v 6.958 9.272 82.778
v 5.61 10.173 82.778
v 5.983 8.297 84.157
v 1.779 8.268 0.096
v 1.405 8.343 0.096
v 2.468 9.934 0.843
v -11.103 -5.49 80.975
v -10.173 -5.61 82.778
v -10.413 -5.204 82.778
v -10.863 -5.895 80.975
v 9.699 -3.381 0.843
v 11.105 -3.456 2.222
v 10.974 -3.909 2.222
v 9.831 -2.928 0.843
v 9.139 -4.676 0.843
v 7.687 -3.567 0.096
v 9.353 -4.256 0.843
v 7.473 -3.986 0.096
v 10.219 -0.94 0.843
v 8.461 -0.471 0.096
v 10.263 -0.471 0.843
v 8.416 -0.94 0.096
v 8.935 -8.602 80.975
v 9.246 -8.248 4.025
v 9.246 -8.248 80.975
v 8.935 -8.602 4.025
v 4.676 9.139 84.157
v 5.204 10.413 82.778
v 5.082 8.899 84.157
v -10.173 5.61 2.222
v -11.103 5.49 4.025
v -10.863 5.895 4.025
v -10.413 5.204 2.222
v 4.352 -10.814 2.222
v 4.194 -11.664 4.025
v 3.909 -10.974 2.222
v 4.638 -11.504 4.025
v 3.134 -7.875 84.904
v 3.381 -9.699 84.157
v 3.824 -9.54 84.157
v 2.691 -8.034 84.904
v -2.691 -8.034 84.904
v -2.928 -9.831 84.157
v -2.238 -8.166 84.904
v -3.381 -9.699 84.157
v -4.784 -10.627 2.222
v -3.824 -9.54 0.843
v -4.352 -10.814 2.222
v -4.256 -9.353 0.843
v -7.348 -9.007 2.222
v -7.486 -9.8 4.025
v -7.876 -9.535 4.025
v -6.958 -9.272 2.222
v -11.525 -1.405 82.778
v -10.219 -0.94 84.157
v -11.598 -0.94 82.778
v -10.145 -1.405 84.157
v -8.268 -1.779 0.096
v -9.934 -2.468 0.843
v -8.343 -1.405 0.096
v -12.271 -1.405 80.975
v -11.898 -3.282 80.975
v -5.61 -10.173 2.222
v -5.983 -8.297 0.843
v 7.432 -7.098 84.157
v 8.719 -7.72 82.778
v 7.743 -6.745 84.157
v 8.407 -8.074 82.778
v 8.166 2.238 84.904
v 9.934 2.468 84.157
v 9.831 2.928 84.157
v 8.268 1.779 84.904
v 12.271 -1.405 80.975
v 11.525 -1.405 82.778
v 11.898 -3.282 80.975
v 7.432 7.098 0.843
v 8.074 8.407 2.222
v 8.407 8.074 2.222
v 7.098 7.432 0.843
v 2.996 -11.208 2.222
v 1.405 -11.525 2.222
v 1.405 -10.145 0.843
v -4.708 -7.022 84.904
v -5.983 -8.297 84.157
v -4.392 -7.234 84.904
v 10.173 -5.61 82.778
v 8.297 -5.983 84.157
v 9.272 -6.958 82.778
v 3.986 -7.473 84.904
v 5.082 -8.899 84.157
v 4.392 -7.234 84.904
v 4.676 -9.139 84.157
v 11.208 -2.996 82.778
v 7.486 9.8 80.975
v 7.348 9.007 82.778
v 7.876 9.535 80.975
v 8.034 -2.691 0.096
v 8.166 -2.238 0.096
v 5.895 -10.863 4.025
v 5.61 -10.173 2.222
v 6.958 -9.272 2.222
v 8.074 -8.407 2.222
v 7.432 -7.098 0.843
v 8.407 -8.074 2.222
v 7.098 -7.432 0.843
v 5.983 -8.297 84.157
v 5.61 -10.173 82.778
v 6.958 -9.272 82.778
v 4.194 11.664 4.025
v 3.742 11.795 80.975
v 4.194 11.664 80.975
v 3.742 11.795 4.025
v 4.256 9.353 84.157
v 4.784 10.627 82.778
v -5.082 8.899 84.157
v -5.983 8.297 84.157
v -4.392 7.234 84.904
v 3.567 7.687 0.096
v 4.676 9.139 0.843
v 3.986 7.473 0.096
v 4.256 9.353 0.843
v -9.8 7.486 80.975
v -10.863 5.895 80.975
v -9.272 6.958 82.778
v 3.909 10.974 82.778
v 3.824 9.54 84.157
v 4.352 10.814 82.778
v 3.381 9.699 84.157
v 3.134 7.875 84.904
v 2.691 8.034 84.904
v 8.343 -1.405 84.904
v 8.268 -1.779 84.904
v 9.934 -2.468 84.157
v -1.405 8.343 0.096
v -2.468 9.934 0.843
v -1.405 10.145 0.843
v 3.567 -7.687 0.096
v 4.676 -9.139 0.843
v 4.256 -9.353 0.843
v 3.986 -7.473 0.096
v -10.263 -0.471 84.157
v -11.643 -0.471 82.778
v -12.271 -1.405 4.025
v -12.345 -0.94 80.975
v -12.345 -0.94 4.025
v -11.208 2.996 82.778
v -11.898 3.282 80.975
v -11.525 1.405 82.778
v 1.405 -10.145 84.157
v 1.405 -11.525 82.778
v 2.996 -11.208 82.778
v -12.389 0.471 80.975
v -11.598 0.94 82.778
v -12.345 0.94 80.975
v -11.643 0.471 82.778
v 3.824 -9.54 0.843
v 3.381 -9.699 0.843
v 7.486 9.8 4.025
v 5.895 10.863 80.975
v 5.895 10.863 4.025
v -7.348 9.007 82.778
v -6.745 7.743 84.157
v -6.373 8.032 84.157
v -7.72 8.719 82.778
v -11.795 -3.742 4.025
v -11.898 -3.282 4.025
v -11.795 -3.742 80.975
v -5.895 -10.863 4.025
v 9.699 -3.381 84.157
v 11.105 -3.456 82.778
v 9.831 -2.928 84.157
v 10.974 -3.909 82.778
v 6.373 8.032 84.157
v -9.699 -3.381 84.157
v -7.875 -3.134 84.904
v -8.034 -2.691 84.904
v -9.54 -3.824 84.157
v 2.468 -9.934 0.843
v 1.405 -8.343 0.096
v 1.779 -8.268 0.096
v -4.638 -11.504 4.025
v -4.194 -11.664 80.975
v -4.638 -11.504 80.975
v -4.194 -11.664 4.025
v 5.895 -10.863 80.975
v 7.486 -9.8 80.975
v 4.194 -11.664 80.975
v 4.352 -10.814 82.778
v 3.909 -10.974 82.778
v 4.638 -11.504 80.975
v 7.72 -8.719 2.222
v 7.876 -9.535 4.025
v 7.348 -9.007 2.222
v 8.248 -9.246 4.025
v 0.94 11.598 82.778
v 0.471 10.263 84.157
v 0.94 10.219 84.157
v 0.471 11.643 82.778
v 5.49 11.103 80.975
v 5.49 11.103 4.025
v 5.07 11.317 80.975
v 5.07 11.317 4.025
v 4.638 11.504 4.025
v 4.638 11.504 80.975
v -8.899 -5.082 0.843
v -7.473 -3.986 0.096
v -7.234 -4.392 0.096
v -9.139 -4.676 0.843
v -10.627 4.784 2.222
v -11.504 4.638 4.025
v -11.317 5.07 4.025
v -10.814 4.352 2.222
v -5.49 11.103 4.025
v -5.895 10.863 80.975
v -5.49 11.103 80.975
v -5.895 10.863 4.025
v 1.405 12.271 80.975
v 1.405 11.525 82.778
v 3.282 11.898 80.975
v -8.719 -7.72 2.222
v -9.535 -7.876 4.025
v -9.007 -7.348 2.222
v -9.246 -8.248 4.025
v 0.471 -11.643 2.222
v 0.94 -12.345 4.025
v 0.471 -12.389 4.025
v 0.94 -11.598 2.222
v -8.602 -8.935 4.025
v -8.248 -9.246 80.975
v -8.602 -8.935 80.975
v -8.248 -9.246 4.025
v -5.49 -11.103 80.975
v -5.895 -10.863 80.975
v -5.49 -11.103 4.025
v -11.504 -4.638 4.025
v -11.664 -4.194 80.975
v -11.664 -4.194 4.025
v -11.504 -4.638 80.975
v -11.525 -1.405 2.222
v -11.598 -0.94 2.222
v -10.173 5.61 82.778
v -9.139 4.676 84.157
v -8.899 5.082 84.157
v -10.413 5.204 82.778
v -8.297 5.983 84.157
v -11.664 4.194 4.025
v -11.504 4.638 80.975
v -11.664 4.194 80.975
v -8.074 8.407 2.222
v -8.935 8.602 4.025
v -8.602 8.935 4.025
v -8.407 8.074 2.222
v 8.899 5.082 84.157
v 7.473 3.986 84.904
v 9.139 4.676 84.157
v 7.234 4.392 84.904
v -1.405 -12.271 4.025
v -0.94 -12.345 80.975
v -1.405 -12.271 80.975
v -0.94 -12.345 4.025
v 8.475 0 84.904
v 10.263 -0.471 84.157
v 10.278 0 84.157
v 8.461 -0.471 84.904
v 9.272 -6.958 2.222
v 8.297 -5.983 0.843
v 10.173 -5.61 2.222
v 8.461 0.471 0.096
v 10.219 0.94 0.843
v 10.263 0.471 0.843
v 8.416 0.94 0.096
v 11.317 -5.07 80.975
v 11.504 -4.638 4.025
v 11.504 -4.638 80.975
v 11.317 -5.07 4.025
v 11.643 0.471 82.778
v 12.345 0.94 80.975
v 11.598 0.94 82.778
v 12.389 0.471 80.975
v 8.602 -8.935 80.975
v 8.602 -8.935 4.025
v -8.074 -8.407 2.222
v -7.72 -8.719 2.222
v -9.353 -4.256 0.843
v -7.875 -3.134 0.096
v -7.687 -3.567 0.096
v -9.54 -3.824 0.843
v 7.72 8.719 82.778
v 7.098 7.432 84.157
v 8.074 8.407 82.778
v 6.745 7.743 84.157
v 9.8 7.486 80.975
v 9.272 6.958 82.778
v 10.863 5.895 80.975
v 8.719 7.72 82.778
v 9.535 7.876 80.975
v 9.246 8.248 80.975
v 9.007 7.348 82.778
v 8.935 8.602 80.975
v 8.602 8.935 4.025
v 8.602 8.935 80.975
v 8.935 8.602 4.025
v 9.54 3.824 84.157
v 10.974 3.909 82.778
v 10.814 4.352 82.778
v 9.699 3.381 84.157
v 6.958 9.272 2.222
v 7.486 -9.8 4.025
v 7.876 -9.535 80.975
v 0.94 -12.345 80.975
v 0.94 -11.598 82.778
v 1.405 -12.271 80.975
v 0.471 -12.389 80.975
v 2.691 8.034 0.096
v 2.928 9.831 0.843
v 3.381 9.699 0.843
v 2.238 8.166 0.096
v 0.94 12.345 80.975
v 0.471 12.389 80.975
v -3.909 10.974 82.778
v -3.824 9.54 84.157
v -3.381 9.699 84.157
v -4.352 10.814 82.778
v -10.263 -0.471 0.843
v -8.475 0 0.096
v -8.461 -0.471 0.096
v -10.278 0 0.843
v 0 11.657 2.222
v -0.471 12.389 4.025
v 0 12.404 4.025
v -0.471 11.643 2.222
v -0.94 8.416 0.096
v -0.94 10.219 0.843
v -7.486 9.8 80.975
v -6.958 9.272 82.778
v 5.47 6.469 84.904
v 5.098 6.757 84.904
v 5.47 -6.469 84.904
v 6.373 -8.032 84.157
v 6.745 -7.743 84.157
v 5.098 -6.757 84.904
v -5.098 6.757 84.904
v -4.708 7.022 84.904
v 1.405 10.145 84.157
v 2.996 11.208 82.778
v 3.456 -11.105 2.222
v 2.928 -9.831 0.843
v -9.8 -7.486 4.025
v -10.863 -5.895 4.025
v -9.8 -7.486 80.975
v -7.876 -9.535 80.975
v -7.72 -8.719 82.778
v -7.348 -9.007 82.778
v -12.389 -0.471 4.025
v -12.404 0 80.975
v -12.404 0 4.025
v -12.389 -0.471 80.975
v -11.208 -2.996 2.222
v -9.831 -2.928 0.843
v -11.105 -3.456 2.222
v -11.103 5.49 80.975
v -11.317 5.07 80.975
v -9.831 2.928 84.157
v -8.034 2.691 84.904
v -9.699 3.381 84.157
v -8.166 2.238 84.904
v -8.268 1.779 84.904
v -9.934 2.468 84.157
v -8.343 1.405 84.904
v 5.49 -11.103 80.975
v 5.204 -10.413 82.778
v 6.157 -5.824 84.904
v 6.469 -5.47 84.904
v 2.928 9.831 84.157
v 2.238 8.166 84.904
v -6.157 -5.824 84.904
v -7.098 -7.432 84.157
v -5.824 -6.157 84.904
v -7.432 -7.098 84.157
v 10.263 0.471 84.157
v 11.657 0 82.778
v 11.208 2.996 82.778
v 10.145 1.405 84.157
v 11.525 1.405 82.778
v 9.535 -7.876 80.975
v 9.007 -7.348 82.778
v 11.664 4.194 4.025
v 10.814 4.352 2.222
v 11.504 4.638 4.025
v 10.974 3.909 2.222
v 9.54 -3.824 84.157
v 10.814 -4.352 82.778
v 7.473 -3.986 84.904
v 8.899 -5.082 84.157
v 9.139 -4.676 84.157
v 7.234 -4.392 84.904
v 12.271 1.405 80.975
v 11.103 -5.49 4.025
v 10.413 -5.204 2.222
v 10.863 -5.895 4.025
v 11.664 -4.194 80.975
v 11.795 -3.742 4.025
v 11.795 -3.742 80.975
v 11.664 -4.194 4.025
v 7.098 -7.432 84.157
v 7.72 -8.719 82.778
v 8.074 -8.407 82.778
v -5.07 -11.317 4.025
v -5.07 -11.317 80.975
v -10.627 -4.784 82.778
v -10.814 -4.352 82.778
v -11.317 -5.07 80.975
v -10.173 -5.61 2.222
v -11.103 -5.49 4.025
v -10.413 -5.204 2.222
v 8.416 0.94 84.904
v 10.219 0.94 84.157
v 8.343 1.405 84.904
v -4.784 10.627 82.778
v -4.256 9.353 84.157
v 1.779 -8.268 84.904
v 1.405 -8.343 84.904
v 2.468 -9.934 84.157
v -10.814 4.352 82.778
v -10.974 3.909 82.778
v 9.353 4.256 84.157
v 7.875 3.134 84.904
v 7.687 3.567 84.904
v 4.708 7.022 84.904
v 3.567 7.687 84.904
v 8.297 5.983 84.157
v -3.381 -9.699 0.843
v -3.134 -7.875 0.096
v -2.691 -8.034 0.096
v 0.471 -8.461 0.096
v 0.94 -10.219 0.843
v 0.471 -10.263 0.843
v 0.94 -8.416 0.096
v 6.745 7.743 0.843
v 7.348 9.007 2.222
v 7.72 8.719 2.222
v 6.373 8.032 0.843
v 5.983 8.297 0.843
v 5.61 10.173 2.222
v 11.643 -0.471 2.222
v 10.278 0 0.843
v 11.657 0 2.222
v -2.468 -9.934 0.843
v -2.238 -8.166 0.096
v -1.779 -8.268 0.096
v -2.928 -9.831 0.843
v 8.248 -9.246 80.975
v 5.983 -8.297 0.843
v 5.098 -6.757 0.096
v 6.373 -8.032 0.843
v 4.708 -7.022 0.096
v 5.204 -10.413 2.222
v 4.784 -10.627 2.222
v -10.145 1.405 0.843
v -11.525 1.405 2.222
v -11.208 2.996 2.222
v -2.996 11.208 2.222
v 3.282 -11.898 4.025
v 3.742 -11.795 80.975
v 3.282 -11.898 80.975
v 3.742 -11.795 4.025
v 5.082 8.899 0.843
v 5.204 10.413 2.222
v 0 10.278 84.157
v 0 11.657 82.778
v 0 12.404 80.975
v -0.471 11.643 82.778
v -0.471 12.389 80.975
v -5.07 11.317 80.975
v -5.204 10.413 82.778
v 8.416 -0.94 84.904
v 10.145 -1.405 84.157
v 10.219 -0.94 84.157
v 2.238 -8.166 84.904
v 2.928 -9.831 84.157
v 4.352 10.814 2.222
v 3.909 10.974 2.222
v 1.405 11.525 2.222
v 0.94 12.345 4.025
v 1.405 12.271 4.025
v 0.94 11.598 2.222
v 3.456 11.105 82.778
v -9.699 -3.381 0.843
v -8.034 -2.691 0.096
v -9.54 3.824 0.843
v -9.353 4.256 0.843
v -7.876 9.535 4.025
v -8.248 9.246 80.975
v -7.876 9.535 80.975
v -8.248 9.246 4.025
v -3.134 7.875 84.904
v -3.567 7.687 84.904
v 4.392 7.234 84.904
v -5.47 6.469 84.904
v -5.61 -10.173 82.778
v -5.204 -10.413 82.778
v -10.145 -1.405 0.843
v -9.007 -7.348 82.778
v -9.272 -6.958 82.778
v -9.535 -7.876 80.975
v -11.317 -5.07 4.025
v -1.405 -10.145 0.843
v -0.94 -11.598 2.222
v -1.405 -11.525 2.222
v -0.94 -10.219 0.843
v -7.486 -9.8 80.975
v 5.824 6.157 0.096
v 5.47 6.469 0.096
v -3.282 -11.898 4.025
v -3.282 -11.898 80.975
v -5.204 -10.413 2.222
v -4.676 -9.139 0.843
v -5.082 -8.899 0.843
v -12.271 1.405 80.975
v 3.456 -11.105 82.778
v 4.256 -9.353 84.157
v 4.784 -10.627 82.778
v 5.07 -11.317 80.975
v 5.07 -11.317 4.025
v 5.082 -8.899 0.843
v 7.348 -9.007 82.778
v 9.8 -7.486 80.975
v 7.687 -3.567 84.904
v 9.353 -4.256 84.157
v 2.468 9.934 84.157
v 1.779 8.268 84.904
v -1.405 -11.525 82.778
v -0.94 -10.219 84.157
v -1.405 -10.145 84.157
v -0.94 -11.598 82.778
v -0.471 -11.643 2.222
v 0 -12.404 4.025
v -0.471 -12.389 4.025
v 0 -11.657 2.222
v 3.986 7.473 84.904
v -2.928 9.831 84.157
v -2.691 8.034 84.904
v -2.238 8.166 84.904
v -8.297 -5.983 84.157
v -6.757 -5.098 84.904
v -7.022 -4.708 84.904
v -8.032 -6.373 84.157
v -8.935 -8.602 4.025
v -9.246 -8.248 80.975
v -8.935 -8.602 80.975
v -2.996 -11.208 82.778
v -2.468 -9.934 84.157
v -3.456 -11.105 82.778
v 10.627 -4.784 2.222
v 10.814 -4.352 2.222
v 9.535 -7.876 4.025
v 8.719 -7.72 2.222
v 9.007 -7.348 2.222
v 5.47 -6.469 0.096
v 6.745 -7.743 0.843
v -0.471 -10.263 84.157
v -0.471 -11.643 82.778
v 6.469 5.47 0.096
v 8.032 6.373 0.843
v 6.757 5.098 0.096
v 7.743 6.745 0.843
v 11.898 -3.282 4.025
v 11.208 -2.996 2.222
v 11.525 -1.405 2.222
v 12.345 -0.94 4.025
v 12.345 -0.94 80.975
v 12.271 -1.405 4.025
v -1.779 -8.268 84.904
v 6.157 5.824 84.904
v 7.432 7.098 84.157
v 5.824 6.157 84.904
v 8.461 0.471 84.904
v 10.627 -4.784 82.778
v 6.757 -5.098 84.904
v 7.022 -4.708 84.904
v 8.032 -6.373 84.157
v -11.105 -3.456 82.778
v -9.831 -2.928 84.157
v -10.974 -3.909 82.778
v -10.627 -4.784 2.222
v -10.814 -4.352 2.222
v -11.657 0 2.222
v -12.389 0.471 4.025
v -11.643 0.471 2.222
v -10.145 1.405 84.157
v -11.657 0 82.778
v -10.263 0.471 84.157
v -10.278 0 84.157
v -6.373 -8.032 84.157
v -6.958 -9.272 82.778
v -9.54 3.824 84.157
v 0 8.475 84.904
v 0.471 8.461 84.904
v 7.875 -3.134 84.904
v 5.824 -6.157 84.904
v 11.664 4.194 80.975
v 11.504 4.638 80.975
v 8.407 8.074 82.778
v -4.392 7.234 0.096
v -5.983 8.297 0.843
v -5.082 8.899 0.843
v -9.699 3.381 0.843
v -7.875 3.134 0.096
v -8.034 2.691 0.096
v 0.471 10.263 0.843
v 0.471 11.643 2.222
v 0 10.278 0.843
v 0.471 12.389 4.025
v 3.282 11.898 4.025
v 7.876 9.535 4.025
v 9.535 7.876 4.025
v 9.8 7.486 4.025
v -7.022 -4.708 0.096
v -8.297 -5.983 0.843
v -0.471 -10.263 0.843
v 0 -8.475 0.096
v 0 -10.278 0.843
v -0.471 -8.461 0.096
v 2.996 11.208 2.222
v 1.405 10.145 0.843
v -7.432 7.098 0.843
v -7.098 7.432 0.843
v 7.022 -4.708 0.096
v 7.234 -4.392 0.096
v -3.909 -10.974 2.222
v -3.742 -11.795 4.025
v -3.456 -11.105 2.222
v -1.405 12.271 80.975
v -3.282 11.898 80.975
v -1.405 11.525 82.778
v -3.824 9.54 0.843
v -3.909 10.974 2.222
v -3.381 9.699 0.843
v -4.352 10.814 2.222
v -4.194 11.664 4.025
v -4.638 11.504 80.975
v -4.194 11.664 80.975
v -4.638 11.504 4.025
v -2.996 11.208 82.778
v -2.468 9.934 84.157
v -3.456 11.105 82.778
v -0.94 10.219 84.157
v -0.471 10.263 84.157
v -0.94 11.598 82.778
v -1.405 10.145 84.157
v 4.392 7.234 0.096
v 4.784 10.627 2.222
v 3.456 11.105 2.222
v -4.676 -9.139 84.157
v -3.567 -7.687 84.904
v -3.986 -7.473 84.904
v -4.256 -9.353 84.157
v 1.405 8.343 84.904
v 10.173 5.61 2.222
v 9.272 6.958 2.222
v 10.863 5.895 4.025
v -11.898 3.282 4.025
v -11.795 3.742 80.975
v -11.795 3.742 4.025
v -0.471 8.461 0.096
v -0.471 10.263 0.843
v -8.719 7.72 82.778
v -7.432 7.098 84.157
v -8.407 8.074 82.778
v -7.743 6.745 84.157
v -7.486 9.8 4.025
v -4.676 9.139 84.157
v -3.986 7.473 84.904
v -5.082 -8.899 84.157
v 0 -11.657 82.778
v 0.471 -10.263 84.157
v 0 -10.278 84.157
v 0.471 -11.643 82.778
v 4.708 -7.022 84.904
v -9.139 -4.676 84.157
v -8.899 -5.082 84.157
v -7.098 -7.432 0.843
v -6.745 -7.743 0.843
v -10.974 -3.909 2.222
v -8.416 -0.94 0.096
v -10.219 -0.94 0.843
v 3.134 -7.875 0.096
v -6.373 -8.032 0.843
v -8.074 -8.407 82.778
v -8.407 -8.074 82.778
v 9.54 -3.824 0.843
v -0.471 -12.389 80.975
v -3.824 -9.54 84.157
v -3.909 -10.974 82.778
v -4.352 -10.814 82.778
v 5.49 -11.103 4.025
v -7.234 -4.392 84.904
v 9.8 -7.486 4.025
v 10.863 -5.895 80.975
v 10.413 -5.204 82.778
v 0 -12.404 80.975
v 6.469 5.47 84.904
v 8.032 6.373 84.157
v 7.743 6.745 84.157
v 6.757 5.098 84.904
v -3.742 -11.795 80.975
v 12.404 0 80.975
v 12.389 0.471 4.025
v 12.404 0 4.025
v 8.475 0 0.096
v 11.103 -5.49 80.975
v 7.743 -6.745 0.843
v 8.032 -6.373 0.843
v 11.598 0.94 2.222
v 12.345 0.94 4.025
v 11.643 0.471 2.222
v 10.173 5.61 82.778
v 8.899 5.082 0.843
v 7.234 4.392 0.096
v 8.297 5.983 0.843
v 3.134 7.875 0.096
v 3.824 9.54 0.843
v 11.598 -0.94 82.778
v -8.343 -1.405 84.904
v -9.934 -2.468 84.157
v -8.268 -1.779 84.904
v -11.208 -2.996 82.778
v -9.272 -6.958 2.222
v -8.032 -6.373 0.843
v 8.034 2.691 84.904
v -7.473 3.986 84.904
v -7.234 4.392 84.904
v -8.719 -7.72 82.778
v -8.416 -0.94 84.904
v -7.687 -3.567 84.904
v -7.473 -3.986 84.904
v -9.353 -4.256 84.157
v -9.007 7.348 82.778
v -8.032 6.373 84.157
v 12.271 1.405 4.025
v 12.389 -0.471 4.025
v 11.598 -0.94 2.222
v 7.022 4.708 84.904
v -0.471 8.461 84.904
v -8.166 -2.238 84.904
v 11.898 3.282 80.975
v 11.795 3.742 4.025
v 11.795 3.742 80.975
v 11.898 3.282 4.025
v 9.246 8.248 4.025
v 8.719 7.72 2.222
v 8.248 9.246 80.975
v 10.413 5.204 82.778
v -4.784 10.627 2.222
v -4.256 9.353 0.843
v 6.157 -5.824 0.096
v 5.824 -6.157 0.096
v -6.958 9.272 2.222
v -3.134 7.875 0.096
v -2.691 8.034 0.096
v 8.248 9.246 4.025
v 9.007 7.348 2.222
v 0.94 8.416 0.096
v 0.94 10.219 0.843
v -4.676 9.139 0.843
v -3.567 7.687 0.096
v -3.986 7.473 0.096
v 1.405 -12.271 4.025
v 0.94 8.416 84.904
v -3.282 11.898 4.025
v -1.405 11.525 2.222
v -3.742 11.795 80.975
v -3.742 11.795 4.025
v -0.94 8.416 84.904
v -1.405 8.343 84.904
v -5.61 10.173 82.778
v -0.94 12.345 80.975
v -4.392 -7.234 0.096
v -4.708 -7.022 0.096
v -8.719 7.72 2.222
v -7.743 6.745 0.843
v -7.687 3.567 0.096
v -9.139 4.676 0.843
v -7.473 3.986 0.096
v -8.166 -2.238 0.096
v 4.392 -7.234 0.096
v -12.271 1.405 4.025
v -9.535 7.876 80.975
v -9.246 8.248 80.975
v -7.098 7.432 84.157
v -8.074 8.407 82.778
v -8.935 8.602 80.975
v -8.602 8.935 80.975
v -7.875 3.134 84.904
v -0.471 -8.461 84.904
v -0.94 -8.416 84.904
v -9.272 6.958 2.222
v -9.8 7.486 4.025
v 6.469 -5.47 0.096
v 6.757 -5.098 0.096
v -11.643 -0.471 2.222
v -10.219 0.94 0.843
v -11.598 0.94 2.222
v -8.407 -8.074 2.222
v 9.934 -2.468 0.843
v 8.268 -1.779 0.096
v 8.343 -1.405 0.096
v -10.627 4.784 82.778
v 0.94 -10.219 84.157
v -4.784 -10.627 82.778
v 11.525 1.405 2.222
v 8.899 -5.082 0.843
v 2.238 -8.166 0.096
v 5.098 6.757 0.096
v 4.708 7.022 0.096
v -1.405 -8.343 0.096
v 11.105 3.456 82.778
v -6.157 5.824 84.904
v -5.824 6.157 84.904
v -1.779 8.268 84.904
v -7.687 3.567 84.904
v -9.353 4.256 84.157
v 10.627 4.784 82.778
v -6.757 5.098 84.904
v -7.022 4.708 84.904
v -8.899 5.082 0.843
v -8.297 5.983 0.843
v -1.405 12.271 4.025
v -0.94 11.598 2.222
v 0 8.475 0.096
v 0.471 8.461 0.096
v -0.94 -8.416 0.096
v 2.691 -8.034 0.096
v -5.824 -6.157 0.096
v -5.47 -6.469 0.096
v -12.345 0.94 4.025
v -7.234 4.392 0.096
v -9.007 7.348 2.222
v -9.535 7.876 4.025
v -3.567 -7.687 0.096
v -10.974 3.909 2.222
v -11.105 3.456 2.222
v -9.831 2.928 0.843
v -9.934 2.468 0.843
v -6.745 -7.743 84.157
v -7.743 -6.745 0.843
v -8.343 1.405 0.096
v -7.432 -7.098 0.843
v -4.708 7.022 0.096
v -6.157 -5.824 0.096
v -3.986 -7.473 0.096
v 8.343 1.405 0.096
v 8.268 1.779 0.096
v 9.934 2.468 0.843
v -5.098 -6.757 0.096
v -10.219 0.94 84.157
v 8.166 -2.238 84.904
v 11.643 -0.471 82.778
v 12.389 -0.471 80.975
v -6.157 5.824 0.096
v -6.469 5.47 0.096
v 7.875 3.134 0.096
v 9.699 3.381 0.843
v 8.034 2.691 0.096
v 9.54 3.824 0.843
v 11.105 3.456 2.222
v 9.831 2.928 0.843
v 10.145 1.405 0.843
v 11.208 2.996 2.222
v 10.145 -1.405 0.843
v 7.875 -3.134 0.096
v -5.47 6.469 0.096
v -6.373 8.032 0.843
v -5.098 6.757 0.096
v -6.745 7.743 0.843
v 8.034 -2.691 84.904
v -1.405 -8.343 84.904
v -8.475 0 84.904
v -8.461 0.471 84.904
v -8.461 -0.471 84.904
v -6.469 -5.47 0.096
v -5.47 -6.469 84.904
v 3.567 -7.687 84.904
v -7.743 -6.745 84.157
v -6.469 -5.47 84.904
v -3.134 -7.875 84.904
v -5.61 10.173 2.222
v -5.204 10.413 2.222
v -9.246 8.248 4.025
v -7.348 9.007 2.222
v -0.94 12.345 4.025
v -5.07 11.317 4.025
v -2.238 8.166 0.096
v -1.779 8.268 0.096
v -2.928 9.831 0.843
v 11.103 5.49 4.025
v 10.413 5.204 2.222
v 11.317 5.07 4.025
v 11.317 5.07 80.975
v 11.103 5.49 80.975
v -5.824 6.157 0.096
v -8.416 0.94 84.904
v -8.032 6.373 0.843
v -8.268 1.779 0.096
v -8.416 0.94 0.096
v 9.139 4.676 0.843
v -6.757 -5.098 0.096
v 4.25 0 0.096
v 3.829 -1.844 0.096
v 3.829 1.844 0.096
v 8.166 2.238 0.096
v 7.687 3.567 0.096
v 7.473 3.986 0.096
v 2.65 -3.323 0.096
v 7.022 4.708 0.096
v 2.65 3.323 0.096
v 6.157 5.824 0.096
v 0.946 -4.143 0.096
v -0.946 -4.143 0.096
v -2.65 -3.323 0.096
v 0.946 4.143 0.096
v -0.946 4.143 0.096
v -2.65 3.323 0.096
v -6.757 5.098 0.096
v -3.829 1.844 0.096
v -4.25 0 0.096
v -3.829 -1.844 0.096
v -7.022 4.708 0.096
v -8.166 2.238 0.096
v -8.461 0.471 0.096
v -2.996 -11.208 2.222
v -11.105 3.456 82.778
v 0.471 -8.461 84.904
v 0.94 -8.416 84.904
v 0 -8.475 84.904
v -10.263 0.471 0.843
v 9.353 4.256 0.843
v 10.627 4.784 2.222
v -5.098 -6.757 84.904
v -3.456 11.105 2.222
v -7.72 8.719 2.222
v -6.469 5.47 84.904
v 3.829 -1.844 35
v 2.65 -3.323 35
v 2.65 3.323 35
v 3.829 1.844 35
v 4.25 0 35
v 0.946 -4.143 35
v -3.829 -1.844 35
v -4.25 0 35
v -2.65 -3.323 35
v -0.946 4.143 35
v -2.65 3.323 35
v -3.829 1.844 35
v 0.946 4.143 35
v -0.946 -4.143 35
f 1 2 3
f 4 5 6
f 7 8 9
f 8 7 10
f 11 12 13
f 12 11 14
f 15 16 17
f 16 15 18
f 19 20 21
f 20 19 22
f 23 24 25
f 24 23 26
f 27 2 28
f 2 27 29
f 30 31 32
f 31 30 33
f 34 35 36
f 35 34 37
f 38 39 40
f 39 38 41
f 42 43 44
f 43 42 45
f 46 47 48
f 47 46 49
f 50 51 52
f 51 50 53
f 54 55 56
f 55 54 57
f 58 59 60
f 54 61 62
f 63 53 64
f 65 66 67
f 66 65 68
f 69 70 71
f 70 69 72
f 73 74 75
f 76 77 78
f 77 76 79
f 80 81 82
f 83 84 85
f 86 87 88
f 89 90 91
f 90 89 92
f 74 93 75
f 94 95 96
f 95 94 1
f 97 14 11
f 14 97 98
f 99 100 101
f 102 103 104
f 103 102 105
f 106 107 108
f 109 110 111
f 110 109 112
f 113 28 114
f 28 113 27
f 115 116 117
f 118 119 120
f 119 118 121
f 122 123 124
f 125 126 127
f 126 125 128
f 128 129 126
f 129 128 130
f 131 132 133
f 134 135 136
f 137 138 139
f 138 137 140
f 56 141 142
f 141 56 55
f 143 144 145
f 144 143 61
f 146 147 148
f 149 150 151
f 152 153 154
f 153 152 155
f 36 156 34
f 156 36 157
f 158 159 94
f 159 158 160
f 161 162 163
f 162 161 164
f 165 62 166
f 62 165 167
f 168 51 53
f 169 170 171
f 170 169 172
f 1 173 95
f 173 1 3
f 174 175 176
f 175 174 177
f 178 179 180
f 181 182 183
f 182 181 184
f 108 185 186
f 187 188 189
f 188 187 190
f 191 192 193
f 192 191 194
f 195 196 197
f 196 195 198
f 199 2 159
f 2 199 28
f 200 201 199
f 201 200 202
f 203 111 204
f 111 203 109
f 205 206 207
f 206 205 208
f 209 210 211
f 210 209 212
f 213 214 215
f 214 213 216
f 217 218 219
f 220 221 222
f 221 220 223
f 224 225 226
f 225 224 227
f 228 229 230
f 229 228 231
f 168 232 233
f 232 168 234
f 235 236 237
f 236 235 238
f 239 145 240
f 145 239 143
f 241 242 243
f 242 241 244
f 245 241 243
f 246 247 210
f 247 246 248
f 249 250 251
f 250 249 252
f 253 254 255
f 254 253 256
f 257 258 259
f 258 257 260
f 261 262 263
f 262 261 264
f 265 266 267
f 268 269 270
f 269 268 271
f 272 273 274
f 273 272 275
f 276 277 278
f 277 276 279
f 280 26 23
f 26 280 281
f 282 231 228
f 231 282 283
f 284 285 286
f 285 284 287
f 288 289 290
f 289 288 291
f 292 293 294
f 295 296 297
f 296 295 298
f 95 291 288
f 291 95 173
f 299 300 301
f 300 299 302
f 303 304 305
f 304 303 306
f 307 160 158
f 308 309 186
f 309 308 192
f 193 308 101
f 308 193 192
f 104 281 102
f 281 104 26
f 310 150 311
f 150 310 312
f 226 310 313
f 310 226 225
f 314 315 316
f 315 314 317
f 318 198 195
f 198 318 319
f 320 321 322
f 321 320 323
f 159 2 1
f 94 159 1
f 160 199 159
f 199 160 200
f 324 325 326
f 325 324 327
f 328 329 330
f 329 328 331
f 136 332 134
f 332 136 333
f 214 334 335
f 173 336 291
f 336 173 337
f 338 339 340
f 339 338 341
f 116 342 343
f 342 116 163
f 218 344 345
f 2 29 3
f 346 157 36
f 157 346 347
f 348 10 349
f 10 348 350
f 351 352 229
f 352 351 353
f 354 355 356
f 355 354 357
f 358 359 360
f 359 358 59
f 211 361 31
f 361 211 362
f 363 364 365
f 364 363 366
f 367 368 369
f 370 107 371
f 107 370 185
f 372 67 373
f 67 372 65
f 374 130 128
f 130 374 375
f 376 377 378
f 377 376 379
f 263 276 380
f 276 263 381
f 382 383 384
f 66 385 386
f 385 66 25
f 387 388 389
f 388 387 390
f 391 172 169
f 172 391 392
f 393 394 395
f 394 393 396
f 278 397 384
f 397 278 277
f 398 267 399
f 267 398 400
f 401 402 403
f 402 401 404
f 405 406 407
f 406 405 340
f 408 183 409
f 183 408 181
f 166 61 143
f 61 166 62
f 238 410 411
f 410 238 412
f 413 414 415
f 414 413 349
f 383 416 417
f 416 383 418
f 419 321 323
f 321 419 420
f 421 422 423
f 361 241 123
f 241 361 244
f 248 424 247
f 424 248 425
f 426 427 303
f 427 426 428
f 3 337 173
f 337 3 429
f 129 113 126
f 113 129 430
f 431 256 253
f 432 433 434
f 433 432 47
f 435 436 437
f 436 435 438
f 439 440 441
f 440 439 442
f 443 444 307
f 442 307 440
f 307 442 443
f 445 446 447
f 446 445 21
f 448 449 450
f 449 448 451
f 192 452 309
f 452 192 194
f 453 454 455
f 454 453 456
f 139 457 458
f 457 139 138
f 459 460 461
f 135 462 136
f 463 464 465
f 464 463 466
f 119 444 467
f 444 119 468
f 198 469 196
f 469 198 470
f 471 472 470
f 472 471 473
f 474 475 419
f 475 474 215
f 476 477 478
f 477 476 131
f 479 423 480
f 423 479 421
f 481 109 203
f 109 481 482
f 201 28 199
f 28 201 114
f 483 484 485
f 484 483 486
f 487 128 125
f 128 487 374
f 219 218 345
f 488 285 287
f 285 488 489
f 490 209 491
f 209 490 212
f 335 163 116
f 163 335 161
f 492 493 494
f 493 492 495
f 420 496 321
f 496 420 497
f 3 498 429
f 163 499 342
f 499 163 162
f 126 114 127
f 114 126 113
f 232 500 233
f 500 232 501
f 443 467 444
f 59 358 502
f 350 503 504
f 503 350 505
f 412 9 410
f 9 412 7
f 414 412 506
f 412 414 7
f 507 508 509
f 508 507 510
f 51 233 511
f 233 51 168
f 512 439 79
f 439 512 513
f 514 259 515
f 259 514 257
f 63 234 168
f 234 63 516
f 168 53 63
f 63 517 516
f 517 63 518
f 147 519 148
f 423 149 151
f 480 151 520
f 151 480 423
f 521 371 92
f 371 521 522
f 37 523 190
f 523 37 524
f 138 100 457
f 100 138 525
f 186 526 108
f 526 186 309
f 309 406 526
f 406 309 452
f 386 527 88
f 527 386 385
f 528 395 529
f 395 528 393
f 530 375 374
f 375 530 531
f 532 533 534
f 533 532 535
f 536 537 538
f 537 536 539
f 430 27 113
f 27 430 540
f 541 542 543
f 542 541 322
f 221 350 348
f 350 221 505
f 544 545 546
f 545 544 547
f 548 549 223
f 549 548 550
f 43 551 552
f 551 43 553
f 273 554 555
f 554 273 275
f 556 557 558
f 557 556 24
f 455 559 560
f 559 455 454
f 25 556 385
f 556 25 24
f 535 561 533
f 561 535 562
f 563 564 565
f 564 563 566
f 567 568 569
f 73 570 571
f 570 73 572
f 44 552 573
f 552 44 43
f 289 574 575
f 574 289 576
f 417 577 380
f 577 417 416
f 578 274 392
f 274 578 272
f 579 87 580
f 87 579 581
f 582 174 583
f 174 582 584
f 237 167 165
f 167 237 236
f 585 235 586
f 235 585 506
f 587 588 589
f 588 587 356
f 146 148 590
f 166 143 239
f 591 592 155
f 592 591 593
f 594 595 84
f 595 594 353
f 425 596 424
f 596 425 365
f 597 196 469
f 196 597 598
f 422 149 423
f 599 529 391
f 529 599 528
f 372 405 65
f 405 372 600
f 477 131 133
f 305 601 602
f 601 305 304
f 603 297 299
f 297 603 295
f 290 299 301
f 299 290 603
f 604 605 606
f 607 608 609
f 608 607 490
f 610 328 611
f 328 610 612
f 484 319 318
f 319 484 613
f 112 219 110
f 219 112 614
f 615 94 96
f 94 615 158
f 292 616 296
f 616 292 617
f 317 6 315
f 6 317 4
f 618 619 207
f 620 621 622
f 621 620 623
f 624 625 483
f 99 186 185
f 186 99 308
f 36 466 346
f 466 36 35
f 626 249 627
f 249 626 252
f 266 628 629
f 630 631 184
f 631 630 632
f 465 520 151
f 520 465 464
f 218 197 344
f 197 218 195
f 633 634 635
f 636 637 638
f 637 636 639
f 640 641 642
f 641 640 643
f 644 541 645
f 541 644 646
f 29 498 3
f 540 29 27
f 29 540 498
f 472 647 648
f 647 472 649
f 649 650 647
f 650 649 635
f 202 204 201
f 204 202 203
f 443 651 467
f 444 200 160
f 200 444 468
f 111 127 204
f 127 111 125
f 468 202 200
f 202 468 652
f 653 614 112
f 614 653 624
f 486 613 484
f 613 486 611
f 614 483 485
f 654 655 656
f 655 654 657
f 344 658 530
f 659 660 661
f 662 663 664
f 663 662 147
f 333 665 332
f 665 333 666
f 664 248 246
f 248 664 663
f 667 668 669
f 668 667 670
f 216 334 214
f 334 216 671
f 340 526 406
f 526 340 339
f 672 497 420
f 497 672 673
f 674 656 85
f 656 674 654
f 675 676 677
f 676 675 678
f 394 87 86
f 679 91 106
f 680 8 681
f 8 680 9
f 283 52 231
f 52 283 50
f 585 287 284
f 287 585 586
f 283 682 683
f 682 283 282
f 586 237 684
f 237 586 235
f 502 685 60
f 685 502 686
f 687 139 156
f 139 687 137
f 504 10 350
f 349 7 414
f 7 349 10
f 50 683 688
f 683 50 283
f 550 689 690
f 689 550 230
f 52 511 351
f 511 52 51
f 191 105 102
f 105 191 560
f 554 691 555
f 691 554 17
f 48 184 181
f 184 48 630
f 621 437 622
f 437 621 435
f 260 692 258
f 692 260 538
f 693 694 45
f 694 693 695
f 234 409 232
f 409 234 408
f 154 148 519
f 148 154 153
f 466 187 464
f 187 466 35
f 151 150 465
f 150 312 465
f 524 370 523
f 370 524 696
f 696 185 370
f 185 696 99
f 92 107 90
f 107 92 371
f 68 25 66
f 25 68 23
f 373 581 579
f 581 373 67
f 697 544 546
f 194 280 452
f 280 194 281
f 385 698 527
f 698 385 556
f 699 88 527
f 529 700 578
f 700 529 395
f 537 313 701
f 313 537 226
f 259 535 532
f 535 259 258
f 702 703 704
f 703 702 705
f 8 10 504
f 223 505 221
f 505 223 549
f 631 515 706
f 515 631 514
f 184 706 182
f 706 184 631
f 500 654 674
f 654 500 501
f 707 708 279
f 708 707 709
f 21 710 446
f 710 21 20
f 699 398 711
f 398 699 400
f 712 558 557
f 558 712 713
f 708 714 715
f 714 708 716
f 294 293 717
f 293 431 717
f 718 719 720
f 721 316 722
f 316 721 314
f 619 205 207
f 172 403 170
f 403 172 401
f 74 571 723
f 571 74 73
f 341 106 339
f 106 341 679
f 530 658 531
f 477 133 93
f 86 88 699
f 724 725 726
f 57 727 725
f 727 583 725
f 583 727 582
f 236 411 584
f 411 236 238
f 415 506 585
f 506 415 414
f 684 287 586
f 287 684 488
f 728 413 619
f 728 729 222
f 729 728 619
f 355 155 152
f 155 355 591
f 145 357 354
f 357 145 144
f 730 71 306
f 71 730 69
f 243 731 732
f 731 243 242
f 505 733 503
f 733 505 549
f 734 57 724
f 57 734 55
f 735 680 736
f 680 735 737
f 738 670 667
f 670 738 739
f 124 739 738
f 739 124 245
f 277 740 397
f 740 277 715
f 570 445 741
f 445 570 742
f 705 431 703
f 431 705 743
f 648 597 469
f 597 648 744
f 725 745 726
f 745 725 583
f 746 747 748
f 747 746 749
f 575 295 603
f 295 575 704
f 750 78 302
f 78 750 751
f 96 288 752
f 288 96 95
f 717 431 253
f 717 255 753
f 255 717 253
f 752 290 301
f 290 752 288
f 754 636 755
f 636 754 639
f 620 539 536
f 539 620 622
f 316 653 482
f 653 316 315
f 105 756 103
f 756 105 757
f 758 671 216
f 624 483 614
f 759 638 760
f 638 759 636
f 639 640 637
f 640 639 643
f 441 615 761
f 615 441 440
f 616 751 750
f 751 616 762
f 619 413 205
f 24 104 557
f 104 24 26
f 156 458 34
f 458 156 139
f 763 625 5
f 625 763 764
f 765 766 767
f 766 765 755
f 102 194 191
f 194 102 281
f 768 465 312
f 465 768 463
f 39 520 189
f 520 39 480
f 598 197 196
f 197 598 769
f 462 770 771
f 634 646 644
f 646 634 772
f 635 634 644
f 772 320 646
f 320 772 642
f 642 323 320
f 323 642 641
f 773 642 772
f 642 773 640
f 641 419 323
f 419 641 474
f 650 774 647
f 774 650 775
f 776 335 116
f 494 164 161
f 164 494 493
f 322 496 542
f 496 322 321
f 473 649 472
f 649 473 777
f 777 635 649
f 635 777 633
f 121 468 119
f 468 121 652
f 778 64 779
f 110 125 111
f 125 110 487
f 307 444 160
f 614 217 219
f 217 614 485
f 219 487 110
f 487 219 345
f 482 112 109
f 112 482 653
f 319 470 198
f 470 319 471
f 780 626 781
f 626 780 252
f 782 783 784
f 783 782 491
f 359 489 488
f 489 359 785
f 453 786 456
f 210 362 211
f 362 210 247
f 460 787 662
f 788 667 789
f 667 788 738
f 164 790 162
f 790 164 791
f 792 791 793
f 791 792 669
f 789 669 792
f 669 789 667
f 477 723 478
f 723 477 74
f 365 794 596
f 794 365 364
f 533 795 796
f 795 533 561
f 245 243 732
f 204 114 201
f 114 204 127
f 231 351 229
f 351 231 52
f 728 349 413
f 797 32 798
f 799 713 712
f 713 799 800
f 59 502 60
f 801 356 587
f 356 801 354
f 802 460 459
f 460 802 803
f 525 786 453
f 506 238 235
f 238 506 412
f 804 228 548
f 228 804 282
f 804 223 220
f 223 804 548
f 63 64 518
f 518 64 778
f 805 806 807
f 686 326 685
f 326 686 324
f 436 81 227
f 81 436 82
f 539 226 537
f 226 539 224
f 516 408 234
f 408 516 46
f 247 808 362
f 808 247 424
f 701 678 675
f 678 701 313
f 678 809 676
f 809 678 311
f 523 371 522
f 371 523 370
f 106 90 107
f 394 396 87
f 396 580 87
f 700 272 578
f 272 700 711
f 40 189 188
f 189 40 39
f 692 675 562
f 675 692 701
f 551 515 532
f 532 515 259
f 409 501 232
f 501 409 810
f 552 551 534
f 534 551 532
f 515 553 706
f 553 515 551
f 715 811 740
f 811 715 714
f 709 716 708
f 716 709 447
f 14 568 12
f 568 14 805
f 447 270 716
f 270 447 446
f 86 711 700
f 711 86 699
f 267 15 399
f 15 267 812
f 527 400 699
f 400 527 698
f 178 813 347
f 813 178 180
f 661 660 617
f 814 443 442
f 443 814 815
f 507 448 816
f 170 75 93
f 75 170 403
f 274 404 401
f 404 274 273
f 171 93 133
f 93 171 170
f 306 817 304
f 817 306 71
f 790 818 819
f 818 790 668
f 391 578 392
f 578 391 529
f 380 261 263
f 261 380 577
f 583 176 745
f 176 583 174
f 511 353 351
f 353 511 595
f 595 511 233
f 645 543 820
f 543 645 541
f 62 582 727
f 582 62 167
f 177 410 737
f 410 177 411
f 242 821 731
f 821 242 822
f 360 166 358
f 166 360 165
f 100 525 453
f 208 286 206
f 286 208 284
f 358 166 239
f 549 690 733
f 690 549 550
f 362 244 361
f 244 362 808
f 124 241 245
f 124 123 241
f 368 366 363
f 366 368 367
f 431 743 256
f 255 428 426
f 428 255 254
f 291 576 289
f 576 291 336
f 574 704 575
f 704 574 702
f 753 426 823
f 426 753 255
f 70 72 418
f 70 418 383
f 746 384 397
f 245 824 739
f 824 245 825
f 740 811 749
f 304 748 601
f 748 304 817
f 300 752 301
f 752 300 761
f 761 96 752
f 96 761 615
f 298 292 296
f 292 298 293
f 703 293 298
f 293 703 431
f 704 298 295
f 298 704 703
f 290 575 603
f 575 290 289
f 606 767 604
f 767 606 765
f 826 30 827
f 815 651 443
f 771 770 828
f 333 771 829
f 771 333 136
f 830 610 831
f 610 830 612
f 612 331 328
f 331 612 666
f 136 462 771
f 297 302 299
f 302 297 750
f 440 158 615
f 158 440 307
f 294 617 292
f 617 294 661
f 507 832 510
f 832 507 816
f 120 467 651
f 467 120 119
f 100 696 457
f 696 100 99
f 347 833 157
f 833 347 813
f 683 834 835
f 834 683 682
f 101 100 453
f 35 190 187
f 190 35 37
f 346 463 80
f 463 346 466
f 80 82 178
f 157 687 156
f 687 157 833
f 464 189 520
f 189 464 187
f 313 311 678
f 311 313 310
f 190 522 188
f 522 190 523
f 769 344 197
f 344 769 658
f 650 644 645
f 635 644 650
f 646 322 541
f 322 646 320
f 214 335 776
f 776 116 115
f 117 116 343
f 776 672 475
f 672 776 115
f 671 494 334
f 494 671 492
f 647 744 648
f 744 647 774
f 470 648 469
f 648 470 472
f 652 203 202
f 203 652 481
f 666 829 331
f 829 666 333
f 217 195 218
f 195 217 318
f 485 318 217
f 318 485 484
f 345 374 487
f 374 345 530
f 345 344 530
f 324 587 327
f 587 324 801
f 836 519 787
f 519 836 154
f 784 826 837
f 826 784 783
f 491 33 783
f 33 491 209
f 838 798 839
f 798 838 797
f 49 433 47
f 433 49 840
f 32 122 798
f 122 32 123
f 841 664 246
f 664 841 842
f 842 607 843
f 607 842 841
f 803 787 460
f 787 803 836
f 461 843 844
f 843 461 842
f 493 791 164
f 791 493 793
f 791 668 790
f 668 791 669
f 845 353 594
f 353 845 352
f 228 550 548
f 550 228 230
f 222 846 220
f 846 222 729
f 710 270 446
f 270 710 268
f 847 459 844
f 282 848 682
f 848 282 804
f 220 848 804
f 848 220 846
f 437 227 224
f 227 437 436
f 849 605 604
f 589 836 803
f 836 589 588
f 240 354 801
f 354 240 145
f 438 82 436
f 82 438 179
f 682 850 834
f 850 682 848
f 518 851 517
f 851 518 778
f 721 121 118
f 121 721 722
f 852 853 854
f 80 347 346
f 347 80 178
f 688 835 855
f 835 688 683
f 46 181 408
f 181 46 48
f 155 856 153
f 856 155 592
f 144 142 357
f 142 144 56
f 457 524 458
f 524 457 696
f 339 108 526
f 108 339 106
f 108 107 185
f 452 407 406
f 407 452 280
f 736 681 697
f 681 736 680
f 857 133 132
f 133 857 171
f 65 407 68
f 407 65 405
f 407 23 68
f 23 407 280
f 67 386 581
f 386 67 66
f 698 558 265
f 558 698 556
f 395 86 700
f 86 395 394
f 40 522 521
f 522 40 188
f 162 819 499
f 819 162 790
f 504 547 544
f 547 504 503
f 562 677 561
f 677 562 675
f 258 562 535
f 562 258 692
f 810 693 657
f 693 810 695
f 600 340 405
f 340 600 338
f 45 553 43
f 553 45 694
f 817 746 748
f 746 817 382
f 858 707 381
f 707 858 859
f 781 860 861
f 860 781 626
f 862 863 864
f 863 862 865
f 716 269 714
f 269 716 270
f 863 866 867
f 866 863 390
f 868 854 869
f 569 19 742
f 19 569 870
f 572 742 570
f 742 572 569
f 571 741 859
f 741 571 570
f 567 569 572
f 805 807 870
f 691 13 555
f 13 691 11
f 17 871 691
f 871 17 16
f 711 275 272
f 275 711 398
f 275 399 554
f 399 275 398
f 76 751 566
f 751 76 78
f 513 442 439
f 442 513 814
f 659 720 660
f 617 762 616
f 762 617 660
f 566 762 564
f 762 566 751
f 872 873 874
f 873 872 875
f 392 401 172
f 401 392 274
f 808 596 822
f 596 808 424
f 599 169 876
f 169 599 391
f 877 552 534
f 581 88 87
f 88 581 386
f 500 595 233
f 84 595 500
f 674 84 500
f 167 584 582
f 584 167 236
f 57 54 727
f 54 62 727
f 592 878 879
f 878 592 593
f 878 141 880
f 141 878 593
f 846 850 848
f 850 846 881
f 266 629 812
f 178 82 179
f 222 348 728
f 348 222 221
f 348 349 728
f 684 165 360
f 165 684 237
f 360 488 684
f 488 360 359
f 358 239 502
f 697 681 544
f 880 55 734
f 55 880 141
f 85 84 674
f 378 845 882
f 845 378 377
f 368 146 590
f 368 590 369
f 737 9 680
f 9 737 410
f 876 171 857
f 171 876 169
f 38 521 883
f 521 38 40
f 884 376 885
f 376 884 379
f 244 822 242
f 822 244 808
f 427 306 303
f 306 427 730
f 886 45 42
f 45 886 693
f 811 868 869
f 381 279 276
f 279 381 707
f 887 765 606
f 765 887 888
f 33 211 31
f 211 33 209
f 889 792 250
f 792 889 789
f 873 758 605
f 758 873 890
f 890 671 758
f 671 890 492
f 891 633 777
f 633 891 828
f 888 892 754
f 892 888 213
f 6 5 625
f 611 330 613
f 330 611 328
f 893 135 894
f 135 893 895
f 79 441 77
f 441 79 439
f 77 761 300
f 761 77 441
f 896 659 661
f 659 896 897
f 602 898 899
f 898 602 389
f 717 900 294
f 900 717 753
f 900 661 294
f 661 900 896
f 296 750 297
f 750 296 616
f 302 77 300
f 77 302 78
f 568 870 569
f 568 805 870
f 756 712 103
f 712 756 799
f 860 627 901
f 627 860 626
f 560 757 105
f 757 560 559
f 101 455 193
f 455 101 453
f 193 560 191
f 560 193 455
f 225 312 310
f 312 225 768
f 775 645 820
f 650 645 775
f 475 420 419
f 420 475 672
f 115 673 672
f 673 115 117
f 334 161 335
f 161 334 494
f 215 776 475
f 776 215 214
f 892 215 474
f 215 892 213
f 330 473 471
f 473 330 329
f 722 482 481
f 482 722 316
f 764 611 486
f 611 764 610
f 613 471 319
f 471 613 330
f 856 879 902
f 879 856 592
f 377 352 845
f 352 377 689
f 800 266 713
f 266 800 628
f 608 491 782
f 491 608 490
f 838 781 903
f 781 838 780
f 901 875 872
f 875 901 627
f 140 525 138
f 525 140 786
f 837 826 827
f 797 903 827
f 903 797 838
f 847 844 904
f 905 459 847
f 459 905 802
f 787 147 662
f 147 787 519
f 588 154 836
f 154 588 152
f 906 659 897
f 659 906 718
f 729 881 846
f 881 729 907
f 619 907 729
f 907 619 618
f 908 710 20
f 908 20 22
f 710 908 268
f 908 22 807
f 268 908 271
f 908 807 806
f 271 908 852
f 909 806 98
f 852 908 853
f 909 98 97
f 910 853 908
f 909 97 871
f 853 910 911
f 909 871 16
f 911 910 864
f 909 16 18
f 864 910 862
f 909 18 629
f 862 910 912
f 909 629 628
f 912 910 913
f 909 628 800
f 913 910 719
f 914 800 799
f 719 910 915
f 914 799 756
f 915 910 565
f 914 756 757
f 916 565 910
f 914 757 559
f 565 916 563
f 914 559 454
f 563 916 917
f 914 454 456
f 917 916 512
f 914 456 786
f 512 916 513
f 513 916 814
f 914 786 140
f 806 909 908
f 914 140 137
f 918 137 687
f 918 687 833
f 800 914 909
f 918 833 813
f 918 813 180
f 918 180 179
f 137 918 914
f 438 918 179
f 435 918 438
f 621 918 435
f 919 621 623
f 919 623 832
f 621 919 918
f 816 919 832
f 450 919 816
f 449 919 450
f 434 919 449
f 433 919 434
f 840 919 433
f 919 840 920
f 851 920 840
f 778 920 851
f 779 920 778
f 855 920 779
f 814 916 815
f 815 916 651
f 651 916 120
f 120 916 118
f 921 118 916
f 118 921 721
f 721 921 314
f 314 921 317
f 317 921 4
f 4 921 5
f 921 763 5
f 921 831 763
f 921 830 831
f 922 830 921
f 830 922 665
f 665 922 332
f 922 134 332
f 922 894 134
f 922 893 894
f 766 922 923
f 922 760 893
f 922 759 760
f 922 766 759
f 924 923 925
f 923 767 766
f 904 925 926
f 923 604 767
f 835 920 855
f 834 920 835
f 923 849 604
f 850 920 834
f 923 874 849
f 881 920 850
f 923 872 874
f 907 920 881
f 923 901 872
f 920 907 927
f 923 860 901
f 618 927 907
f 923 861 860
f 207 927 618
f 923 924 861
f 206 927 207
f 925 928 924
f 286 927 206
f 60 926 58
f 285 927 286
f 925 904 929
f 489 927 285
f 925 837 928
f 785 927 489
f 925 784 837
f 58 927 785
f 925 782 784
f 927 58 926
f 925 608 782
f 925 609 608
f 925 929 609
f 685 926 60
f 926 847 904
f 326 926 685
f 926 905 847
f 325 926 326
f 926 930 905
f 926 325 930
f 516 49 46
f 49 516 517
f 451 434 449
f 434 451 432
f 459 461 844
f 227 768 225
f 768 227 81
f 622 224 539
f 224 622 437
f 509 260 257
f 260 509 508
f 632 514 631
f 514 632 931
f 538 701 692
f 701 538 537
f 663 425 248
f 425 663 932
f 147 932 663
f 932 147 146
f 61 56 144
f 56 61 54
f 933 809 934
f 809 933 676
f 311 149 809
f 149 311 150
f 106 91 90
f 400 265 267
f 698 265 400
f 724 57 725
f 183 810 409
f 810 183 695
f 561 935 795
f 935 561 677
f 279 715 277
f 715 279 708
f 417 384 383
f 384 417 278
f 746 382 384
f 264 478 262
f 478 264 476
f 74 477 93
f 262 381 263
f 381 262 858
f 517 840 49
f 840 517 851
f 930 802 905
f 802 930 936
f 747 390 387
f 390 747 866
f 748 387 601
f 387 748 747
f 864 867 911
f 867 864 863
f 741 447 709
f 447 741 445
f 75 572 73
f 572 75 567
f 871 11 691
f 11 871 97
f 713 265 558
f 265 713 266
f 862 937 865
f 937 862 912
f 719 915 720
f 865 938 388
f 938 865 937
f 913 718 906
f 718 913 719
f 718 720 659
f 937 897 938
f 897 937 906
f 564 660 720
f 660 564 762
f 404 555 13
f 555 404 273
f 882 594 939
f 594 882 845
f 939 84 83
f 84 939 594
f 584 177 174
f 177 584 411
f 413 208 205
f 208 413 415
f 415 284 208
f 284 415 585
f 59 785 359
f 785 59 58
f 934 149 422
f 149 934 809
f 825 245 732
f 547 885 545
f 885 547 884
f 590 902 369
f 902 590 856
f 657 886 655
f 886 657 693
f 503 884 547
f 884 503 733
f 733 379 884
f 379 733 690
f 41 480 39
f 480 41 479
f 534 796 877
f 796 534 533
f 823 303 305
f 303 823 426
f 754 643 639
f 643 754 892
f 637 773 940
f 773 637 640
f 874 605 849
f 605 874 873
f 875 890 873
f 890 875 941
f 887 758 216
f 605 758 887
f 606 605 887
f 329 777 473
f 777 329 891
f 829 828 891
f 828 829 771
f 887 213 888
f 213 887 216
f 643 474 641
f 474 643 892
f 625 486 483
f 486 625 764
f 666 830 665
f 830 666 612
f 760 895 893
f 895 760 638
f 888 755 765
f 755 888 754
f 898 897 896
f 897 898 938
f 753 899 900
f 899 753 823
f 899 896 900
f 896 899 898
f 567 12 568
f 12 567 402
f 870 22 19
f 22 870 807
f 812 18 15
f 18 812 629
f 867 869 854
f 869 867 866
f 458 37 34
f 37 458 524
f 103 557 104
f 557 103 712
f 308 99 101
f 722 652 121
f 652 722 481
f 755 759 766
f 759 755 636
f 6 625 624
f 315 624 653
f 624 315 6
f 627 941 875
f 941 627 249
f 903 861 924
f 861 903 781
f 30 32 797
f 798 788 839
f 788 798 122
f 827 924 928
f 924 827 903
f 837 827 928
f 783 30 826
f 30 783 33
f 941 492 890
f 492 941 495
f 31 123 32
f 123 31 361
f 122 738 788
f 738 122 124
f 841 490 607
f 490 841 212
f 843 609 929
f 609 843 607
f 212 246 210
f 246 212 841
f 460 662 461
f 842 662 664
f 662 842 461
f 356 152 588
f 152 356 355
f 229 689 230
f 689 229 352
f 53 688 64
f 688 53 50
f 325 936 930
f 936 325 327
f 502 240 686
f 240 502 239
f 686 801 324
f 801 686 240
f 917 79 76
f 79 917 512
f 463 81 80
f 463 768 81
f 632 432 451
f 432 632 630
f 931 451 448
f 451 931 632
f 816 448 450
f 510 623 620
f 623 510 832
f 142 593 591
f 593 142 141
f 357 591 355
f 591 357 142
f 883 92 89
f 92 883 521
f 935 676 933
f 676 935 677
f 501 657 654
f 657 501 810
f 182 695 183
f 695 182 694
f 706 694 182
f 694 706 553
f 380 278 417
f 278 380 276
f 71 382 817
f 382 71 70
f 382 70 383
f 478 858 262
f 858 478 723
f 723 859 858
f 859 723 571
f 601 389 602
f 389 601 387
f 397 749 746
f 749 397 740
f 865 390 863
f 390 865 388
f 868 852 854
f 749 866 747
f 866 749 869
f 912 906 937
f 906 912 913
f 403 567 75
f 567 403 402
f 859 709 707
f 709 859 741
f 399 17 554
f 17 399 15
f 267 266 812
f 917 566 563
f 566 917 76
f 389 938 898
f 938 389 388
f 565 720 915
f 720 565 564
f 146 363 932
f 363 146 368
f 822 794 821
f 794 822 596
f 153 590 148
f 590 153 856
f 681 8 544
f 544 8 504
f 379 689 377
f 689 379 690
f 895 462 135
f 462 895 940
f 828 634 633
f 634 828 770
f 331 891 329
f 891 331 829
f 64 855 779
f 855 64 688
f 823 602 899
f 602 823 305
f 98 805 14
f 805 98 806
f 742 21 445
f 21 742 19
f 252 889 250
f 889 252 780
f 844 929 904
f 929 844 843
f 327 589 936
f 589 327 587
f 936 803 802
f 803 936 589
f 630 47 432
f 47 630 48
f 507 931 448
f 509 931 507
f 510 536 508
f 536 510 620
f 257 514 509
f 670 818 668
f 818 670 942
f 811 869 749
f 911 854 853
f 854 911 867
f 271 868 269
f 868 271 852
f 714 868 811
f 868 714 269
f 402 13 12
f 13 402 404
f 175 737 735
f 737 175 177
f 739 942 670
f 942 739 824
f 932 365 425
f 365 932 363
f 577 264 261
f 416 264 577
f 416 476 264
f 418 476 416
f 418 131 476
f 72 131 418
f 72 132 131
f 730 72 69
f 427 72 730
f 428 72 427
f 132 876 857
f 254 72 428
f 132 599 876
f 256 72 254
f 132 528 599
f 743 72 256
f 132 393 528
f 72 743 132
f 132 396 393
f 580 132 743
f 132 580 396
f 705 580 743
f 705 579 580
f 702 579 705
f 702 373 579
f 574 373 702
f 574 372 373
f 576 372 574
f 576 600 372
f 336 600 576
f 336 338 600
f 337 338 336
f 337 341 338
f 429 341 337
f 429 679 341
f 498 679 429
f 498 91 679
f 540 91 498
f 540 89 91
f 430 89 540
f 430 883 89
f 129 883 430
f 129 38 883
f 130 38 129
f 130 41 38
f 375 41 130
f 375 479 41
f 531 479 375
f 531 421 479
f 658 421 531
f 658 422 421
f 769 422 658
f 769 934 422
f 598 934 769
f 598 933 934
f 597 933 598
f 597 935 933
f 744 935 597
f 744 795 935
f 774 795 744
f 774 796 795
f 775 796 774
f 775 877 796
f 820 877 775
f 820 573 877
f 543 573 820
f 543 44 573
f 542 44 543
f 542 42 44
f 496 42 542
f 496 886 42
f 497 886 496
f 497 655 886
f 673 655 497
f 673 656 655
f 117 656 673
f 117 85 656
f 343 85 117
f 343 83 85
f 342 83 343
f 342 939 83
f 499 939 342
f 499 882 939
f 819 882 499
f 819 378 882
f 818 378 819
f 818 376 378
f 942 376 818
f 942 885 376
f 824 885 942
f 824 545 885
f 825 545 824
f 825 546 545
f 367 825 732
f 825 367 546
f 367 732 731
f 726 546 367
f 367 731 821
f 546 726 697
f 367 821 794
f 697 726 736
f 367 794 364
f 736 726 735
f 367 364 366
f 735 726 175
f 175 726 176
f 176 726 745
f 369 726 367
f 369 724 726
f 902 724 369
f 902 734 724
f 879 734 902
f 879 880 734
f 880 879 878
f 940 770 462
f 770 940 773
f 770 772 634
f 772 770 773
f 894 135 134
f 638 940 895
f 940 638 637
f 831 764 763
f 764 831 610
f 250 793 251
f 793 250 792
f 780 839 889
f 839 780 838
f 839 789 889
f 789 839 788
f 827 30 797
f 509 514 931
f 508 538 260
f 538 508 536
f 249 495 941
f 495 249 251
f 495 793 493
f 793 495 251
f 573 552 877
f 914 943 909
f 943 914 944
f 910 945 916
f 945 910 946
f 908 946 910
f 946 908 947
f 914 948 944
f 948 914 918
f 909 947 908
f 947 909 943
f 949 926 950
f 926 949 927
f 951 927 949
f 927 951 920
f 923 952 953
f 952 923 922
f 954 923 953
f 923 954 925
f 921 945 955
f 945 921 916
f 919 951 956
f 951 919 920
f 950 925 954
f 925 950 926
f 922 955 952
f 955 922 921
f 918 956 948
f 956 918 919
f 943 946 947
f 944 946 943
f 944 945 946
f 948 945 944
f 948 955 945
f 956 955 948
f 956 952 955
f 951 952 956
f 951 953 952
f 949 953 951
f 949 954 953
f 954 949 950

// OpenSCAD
height = 75;
outsideDiameter = 25;
holeDepth = 35;
holeDiameter = 8.5;
filletRadius = 5;
difference() {
    translate ([0, 0, filletRadius]){ minkowski() {
        cylinder(height, outsideDiameter/2-filletRadius, outsideDiameter/2-filletRadius, $fn=100);
        sphere(filletRadius);
    }}

    cylinder(holeDepth, holeDiameter/2, holeDiameter/2);
}
